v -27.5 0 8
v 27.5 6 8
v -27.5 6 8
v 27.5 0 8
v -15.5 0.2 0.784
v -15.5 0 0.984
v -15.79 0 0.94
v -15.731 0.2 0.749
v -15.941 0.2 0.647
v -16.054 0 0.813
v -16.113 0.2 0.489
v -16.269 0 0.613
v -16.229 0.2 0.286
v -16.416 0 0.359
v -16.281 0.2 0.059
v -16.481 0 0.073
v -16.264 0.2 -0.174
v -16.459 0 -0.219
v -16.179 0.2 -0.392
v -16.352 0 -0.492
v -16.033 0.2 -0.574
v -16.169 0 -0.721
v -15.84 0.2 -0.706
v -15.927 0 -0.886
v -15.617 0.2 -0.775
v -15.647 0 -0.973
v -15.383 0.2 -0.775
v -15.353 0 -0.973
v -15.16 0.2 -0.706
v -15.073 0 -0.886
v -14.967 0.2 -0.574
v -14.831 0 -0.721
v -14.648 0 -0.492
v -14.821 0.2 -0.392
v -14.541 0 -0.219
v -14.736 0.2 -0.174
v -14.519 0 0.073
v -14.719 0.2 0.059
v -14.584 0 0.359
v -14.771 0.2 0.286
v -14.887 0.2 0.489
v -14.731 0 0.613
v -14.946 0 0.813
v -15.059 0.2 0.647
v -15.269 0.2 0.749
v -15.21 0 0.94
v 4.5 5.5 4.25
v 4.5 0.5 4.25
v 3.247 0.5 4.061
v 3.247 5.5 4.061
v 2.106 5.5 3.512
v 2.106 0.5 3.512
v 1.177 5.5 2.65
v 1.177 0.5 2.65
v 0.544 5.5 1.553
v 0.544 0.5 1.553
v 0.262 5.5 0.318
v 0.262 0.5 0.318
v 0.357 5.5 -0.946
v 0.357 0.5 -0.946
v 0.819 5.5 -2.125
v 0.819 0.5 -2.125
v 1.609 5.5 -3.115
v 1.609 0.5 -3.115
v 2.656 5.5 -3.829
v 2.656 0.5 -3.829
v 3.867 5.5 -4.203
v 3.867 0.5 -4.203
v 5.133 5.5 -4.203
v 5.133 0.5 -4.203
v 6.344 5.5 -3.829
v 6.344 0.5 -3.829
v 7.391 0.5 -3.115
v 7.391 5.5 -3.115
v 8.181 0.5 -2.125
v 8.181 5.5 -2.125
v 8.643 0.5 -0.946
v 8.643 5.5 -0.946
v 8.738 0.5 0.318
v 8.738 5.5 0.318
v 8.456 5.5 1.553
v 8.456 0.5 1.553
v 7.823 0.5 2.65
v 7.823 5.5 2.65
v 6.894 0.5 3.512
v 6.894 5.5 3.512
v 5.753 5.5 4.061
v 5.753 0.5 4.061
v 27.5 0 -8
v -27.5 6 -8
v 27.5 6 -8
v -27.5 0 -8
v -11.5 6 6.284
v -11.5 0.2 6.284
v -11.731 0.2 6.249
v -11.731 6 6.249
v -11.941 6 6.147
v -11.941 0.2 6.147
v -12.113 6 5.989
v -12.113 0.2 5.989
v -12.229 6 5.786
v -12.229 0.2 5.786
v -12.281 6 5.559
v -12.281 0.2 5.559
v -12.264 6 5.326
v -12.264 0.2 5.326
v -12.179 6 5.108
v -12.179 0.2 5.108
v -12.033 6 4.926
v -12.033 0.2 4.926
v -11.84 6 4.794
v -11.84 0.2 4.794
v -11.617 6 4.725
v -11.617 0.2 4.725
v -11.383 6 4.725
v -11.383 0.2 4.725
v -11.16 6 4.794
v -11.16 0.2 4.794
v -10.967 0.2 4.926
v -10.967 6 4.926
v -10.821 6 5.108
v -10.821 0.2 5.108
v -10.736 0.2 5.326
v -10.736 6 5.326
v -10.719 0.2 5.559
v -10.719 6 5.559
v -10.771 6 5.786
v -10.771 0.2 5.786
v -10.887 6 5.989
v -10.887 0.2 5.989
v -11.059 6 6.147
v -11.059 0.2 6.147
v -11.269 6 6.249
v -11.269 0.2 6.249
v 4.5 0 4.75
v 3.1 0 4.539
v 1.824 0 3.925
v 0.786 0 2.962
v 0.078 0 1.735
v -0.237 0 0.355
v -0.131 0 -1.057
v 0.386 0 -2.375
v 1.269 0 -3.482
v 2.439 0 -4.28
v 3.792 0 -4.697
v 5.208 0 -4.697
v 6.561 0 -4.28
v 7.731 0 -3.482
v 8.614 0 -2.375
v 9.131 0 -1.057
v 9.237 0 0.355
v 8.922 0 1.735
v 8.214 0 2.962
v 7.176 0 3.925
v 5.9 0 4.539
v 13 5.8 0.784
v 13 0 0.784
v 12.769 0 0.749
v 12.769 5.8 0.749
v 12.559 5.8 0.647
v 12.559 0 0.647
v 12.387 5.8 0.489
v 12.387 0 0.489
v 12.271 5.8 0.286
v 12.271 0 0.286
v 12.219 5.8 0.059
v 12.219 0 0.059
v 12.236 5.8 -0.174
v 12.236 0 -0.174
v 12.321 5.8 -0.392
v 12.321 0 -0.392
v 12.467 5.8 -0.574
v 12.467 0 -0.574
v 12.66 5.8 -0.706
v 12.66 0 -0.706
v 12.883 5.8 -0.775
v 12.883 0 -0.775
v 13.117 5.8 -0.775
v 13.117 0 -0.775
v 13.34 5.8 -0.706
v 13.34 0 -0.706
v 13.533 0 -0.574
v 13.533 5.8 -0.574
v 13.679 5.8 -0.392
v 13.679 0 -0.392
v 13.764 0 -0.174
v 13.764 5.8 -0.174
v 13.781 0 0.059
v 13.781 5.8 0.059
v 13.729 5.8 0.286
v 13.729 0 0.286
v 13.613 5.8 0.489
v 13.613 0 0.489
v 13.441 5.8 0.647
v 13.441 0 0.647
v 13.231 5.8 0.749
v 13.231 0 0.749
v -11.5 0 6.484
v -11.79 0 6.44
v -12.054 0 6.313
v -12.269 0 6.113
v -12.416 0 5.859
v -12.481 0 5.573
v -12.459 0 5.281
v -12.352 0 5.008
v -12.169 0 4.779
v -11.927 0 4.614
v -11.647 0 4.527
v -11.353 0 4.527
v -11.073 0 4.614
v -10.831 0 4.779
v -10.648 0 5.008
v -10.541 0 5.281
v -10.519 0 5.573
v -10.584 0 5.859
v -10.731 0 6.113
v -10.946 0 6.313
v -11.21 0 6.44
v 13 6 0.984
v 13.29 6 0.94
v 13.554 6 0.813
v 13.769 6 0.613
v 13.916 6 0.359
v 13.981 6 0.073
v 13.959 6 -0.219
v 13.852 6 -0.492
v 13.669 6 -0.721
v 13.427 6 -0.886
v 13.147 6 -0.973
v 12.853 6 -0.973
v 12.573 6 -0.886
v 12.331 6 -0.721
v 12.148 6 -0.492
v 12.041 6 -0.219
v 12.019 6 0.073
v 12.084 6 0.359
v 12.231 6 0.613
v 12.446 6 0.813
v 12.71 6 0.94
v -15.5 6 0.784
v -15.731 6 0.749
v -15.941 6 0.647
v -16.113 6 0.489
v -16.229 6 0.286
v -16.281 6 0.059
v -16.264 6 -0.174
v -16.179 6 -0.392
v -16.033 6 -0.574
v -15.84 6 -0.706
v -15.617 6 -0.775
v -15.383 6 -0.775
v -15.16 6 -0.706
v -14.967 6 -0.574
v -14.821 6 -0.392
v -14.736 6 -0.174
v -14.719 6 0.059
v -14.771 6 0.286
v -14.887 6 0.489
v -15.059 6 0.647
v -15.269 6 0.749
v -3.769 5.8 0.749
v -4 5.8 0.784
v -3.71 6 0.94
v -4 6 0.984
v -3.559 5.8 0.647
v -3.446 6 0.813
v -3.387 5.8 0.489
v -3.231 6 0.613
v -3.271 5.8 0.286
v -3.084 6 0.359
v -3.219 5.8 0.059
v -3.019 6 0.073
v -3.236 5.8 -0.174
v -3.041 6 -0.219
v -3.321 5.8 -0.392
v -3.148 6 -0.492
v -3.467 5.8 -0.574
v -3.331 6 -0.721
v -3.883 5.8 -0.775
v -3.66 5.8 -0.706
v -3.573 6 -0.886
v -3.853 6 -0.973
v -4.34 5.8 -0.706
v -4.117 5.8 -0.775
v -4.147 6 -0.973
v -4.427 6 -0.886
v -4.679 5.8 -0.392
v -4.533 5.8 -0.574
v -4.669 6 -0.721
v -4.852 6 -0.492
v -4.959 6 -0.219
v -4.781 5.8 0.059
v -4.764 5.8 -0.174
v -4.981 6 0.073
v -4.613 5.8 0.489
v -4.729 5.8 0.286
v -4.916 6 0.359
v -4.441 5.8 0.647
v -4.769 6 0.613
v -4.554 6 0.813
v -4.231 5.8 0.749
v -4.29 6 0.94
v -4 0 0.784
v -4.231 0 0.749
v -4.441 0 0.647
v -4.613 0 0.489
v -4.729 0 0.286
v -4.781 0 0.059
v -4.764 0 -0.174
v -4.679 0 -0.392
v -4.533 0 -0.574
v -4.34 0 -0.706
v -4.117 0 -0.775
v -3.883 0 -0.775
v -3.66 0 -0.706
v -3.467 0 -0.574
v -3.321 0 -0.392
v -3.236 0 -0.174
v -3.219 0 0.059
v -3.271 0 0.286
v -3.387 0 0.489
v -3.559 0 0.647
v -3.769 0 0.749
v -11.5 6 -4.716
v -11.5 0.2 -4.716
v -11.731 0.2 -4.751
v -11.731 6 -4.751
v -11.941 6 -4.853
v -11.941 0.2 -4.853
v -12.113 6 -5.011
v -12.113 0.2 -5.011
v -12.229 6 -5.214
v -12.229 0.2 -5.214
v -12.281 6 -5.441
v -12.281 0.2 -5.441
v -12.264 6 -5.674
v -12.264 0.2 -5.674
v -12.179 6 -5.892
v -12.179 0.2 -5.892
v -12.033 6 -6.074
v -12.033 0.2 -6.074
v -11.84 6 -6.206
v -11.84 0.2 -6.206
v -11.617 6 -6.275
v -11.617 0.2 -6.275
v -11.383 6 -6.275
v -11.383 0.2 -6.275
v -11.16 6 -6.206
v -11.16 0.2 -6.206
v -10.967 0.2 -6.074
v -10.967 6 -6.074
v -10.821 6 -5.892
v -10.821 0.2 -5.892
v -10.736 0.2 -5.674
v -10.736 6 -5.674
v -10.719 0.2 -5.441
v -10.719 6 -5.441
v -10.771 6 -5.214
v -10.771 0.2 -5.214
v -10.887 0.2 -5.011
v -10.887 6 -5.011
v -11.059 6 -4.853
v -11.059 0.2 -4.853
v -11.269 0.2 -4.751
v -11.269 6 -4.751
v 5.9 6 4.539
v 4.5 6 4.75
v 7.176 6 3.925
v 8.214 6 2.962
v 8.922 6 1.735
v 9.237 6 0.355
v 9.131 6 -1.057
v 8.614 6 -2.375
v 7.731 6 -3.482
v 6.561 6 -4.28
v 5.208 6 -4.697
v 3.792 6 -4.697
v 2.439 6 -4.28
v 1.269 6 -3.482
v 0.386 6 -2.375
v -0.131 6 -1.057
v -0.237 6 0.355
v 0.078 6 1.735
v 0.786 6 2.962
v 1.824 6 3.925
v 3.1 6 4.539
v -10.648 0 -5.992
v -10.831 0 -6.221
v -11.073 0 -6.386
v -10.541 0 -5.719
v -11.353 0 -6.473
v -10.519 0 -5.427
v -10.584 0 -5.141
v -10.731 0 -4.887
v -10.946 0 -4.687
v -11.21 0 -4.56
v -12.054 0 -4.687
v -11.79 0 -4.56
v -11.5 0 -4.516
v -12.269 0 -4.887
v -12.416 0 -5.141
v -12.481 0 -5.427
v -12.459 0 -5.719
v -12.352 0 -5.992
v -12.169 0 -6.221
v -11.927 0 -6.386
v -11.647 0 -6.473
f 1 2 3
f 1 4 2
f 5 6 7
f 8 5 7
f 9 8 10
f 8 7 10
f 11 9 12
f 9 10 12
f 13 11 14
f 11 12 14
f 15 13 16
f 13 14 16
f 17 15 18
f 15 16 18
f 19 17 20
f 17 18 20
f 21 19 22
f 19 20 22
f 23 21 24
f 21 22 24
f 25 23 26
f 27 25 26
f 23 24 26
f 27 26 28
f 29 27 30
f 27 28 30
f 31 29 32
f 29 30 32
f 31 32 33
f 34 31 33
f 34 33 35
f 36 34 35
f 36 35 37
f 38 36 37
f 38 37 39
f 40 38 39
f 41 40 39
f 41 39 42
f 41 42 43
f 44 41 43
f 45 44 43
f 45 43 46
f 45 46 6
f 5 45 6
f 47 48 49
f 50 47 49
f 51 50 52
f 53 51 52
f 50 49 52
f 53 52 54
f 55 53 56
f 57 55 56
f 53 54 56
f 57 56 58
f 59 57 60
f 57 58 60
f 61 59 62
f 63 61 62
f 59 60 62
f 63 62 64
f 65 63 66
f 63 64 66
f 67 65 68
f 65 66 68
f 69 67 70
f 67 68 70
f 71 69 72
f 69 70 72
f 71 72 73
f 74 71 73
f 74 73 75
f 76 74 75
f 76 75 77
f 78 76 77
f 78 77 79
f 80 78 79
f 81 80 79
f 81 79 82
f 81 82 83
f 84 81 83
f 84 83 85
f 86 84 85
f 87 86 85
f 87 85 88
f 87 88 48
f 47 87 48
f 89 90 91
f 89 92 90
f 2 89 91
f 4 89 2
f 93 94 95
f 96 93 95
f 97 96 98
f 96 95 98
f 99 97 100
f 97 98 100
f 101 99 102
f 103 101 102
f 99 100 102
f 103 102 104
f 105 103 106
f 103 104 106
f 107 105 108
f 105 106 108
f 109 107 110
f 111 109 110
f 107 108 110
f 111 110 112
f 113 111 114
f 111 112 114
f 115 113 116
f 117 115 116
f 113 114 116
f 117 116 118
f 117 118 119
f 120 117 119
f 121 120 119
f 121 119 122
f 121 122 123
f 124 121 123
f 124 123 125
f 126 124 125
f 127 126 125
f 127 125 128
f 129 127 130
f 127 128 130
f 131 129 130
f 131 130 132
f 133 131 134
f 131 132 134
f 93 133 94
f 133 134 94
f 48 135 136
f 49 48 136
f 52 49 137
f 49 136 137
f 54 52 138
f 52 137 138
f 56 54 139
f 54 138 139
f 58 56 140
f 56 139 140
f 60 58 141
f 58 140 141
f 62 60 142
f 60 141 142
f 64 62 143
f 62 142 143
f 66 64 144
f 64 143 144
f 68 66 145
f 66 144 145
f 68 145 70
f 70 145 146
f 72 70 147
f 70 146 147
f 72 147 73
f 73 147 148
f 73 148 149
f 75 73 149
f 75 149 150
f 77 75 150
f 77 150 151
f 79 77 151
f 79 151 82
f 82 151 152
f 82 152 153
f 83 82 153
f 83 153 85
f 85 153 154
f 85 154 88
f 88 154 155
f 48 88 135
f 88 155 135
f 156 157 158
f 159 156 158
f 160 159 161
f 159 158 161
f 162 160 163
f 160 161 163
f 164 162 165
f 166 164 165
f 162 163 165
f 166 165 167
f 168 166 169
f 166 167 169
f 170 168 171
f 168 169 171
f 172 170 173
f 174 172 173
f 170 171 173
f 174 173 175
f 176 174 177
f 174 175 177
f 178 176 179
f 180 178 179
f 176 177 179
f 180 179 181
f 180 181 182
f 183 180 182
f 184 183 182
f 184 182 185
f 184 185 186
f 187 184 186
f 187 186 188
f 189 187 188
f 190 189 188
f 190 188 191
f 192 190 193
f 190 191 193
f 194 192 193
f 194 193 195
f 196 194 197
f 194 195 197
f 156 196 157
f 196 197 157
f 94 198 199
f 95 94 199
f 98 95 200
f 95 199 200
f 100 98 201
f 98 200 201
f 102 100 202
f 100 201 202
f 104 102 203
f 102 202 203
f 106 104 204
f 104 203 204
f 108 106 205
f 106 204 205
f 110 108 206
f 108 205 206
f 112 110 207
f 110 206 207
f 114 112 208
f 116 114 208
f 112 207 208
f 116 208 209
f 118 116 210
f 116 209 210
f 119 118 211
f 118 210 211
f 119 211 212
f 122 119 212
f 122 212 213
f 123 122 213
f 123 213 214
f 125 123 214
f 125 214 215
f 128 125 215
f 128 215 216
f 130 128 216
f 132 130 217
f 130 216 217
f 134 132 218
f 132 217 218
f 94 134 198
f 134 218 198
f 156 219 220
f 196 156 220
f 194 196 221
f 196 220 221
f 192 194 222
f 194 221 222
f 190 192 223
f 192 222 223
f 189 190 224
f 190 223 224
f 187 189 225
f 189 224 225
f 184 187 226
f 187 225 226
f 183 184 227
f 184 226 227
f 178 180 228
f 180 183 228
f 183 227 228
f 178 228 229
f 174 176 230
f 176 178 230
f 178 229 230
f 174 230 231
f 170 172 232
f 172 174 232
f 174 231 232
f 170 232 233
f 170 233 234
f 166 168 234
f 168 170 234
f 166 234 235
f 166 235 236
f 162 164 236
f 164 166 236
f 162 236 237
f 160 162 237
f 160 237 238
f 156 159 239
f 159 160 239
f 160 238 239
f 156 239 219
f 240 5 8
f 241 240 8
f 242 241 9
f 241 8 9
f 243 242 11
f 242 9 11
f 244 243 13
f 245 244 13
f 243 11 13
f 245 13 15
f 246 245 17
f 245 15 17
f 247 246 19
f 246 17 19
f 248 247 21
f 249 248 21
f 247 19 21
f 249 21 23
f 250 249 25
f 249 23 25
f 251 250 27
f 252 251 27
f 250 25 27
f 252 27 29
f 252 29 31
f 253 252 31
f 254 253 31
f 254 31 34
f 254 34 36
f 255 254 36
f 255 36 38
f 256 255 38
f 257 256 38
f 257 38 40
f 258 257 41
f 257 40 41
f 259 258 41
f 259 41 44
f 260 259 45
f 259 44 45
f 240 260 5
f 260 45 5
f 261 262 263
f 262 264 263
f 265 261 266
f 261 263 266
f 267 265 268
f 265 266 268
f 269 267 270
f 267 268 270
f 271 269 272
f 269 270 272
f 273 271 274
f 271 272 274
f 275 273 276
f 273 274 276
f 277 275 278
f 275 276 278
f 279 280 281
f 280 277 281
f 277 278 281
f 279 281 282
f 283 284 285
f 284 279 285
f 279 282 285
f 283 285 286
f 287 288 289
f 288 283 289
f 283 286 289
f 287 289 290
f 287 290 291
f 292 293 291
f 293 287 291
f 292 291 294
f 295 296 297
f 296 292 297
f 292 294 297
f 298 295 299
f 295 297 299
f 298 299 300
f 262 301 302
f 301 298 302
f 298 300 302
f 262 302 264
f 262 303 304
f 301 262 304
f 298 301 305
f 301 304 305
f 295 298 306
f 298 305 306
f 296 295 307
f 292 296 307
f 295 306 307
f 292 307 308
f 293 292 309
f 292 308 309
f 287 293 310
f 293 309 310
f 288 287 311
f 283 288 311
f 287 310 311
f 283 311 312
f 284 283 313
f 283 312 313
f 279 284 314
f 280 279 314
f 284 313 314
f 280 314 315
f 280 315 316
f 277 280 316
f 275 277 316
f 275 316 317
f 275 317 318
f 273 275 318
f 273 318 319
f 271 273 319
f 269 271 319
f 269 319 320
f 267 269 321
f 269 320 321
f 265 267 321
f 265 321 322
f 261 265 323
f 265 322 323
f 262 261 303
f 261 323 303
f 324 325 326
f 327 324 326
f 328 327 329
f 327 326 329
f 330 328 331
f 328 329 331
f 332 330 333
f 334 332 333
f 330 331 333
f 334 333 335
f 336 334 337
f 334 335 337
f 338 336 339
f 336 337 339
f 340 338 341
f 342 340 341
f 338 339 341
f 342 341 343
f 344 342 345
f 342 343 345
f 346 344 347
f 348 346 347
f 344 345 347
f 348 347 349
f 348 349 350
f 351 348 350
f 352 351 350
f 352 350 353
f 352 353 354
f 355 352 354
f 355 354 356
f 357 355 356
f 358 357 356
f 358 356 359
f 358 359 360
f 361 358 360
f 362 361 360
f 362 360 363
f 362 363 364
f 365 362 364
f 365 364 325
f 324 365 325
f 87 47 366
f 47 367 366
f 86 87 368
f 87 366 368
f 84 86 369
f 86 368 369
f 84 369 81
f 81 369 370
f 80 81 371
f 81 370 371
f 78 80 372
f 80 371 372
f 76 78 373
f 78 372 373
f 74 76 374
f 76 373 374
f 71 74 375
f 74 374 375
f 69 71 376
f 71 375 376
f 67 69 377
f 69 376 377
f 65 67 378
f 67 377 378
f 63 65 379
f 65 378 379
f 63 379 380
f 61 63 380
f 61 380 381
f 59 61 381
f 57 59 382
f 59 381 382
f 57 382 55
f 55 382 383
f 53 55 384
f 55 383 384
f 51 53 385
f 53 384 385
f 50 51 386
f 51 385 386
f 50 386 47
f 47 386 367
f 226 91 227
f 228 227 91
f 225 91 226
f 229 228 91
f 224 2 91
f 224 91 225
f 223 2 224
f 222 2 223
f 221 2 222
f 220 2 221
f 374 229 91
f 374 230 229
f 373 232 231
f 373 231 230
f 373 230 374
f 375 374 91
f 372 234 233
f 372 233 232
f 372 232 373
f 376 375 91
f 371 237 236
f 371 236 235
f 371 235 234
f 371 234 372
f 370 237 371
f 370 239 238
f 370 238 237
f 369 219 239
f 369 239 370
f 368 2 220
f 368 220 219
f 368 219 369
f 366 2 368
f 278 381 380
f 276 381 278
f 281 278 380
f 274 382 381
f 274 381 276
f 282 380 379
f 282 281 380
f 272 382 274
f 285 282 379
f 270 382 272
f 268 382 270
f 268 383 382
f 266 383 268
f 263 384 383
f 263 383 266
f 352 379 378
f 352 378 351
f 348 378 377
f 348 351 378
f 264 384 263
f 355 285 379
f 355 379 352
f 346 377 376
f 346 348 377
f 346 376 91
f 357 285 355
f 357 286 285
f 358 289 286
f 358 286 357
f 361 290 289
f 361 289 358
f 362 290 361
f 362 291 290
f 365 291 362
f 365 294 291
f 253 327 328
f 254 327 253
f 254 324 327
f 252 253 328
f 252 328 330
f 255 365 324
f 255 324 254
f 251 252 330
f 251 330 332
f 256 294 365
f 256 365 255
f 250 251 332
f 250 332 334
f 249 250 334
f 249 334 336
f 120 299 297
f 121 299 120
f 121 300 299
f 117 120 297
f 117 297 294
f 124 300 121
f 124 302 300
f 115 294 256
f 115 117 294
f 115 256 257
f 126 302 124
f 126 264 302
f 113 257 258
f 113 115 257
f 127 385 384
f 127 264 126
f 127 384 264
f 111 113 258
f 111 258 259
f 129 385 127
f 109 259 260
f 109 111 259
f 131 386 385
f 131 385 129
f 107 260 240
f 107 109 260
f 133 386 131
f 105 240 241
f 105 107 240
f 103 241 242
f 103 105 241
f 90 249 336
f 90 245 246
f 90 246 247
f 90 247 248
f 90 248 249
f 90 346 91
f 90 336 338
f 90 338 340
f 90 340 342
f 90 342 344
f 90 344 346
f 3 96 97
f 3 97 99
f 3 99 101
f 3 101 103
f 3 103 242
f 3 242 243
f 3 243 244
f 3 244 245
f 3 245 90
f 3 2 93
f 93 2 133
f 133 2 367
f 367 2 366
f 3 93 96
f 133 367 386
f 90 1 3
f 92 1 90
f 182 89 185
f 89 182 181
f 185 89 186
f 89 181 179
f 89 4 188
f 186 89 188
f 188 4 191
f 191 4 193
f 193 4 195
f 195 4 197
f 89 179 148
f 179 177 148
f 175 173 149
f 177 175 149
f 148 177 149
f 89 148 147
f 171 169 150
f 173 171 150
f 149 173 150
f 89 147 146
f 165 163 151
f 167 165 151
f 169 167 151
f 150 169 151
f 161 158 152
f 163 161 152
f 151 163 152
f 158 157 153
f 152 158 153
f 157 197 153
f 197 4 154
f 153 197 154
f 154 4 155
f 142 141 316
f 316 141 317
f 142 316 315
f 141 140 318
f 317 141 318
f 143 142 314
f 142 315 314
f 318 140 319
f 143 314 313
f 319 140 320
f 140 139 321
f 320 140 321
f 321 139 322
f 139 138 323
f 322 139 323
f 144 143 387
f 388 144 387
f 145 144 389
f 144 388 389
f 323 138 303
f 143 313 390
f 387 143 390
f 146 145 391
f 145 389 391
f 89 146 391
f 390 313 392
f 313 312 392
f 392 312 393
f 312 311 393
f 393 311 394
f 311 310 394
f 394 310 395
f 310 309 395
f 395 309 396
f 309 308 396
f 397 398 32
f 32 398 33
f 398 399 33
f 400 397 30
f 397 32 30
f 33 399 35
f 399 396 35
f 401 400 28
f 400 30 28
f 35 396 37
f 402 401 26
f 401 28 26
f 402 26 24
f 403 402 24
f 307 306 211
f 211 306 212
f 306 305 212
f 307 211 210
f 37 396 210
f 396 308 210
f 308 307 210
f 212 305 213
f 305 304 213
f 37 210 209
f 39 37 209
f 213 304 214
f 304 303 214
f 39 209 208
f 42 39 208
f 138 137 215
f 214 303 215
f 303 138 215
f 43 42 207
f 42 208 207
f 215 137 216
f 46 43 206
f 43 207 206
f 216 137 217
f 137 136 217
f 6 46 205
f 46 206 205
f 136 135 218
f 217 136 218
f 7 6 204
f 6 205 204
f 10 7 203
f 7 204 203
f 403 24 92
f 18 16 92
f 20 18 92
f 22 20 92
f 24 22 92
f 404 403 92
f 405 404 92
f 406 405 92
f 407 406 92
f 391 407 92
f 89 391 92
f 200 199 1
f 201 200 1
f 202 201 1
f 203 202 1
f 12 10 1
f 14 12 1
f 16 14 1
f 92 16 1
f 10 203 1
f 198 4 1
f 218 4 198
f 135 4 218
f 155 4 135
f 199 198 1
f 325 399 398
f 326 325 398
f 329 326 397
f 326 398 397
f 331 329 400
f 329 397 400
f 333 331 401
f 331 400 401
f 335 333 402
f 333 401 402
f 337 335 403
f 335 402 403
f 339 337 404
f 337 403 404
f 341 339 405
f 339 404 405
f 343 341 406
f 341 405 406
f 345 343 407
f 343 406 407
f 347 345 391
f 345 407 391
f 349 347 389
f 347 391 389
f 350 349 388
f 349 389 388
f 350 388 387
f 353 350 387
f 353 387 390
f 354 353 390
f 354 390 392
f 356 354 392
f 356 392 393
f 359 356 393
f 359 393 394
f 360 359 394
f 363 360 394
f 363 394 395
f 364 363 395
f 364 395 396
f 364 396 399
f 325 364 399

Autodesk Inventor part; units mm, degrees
ref_plane "YZ Plane" through (0, 0, 0) normal (1, 0, 0) x (0, 1, 0)
ref_plane "XZ Plane" through (0, 0, 0) normal (0, 1, 0) x (-1, 0, 0)
ref_plane "XY Plane" through (0, 0, 0) normal (0, 0, 1) x (1, 0, 0)
sketch "Sketch1" plane through (0, 0, 0) normal (0, 1, 0) x (-1, 0, 0)
  line L0 (-27.5, 8) -> (27.5, 8)
  line L1 (27.5, 8) -> (27.5, -8)
  line L2 (27.5, -8) -> (-27.5, -8)
  line L3 (-27.5, -8) -> (-27.5, 8)
  line L4 (-27.5, 8) -> (27.5, -8) construction
  line L5 (27.5, 8) -> (-27.5, -8) construction
  point P0 (0, 0)
  dimension "d0" = 55
  dimension "d1" = 16
extrude "Extrusion1" add sketch "Sketch1" along normal blind 6
sketch "Sketch2" plane through (0, 6, 0) normal (0, 1, 0) x (1, 0, 0)
  line L0 (27.5, 8) -> (-27.5, 8) construction
  line L1 (-27.5, 8) -> (-27.5, -8) construction
  line L2 (-27.5, -8) -> (27.5, -8) construction
  line L3 (27.5, -8) -> (27.5, 8) construction
  point P0 (0, 0)
  point P1 (4.5, 0)
  dimension "d4" = 23
hole "Hole1" at (4.5, 6, 0) direction (0, -1, 0) diameter 8.5 end through all
chamfer "Chamfer1" distance 0.5 angle 45 2 edges at (4.5, 0, -4.25) (4.5, 6, -4.25)
sketch "Sketch3" plane through (0, 6, 0) normal (0, 1, 0) x (1, 0, 0)
  circle A0 centre (-15.5, 0) radius 1.4 construction
  line L0 (-18.5, 8) -> (-4.5, 8) construction
  line L1 (-4.5, 8) -> (-4.5, -8) construction
  line L2 (-4.5, -8) -> (-18.5, -8) construction
  line L3 (-18.5, 8) -> (-18.5, -8) projected
  circle A1 centre (-11.5, 5.5) radius 1.4 projected
  circle A2 centre (-11.5, -5.5) radius 1.4 projected
  point P0 (0, 0)
  point P1 (-15.5, 0)
hole "Hole2" at (-15.5, 6, 0) at (-11.5, 6, -5.5) at (-11.5, 6, 5.5) direction (0, -1, 0) diameter 1.567 end through all thread size "M2x0.4" class "6H" standard "ISO Metric profile"
chamfer "Chamfer2" distance 0.2 angle 45 3 edges at (-11.5, 0, -6.2835) (-15.5, 0, -0.7835) (-11.5, 0, 4.7165)
sketch "Sketch4" plane through (0, 6, 0) normal (0, 1, 0) x (1, 0, 0)
  circle A0 centre (-4, 0) radius 2.2 construction
  circle A1 centre (13, 0) radius 2.2 construction
  point P0 (0, 0)
hole "Hole3" at (-4, 6, 0) at (13, 6, 0) direction (0, -1, 0) diameter 1.567 end through all thread size "M2x0.4" class "6H" standard "ISO Metric profile"
chamfer "Chamfer3" distance 0.2 angle 45 2 edges at (13, 6, -0.7835) (-4, 6, -0.7835)
properties part number "KN-00-02-11" material "X5CrNi18-10"
